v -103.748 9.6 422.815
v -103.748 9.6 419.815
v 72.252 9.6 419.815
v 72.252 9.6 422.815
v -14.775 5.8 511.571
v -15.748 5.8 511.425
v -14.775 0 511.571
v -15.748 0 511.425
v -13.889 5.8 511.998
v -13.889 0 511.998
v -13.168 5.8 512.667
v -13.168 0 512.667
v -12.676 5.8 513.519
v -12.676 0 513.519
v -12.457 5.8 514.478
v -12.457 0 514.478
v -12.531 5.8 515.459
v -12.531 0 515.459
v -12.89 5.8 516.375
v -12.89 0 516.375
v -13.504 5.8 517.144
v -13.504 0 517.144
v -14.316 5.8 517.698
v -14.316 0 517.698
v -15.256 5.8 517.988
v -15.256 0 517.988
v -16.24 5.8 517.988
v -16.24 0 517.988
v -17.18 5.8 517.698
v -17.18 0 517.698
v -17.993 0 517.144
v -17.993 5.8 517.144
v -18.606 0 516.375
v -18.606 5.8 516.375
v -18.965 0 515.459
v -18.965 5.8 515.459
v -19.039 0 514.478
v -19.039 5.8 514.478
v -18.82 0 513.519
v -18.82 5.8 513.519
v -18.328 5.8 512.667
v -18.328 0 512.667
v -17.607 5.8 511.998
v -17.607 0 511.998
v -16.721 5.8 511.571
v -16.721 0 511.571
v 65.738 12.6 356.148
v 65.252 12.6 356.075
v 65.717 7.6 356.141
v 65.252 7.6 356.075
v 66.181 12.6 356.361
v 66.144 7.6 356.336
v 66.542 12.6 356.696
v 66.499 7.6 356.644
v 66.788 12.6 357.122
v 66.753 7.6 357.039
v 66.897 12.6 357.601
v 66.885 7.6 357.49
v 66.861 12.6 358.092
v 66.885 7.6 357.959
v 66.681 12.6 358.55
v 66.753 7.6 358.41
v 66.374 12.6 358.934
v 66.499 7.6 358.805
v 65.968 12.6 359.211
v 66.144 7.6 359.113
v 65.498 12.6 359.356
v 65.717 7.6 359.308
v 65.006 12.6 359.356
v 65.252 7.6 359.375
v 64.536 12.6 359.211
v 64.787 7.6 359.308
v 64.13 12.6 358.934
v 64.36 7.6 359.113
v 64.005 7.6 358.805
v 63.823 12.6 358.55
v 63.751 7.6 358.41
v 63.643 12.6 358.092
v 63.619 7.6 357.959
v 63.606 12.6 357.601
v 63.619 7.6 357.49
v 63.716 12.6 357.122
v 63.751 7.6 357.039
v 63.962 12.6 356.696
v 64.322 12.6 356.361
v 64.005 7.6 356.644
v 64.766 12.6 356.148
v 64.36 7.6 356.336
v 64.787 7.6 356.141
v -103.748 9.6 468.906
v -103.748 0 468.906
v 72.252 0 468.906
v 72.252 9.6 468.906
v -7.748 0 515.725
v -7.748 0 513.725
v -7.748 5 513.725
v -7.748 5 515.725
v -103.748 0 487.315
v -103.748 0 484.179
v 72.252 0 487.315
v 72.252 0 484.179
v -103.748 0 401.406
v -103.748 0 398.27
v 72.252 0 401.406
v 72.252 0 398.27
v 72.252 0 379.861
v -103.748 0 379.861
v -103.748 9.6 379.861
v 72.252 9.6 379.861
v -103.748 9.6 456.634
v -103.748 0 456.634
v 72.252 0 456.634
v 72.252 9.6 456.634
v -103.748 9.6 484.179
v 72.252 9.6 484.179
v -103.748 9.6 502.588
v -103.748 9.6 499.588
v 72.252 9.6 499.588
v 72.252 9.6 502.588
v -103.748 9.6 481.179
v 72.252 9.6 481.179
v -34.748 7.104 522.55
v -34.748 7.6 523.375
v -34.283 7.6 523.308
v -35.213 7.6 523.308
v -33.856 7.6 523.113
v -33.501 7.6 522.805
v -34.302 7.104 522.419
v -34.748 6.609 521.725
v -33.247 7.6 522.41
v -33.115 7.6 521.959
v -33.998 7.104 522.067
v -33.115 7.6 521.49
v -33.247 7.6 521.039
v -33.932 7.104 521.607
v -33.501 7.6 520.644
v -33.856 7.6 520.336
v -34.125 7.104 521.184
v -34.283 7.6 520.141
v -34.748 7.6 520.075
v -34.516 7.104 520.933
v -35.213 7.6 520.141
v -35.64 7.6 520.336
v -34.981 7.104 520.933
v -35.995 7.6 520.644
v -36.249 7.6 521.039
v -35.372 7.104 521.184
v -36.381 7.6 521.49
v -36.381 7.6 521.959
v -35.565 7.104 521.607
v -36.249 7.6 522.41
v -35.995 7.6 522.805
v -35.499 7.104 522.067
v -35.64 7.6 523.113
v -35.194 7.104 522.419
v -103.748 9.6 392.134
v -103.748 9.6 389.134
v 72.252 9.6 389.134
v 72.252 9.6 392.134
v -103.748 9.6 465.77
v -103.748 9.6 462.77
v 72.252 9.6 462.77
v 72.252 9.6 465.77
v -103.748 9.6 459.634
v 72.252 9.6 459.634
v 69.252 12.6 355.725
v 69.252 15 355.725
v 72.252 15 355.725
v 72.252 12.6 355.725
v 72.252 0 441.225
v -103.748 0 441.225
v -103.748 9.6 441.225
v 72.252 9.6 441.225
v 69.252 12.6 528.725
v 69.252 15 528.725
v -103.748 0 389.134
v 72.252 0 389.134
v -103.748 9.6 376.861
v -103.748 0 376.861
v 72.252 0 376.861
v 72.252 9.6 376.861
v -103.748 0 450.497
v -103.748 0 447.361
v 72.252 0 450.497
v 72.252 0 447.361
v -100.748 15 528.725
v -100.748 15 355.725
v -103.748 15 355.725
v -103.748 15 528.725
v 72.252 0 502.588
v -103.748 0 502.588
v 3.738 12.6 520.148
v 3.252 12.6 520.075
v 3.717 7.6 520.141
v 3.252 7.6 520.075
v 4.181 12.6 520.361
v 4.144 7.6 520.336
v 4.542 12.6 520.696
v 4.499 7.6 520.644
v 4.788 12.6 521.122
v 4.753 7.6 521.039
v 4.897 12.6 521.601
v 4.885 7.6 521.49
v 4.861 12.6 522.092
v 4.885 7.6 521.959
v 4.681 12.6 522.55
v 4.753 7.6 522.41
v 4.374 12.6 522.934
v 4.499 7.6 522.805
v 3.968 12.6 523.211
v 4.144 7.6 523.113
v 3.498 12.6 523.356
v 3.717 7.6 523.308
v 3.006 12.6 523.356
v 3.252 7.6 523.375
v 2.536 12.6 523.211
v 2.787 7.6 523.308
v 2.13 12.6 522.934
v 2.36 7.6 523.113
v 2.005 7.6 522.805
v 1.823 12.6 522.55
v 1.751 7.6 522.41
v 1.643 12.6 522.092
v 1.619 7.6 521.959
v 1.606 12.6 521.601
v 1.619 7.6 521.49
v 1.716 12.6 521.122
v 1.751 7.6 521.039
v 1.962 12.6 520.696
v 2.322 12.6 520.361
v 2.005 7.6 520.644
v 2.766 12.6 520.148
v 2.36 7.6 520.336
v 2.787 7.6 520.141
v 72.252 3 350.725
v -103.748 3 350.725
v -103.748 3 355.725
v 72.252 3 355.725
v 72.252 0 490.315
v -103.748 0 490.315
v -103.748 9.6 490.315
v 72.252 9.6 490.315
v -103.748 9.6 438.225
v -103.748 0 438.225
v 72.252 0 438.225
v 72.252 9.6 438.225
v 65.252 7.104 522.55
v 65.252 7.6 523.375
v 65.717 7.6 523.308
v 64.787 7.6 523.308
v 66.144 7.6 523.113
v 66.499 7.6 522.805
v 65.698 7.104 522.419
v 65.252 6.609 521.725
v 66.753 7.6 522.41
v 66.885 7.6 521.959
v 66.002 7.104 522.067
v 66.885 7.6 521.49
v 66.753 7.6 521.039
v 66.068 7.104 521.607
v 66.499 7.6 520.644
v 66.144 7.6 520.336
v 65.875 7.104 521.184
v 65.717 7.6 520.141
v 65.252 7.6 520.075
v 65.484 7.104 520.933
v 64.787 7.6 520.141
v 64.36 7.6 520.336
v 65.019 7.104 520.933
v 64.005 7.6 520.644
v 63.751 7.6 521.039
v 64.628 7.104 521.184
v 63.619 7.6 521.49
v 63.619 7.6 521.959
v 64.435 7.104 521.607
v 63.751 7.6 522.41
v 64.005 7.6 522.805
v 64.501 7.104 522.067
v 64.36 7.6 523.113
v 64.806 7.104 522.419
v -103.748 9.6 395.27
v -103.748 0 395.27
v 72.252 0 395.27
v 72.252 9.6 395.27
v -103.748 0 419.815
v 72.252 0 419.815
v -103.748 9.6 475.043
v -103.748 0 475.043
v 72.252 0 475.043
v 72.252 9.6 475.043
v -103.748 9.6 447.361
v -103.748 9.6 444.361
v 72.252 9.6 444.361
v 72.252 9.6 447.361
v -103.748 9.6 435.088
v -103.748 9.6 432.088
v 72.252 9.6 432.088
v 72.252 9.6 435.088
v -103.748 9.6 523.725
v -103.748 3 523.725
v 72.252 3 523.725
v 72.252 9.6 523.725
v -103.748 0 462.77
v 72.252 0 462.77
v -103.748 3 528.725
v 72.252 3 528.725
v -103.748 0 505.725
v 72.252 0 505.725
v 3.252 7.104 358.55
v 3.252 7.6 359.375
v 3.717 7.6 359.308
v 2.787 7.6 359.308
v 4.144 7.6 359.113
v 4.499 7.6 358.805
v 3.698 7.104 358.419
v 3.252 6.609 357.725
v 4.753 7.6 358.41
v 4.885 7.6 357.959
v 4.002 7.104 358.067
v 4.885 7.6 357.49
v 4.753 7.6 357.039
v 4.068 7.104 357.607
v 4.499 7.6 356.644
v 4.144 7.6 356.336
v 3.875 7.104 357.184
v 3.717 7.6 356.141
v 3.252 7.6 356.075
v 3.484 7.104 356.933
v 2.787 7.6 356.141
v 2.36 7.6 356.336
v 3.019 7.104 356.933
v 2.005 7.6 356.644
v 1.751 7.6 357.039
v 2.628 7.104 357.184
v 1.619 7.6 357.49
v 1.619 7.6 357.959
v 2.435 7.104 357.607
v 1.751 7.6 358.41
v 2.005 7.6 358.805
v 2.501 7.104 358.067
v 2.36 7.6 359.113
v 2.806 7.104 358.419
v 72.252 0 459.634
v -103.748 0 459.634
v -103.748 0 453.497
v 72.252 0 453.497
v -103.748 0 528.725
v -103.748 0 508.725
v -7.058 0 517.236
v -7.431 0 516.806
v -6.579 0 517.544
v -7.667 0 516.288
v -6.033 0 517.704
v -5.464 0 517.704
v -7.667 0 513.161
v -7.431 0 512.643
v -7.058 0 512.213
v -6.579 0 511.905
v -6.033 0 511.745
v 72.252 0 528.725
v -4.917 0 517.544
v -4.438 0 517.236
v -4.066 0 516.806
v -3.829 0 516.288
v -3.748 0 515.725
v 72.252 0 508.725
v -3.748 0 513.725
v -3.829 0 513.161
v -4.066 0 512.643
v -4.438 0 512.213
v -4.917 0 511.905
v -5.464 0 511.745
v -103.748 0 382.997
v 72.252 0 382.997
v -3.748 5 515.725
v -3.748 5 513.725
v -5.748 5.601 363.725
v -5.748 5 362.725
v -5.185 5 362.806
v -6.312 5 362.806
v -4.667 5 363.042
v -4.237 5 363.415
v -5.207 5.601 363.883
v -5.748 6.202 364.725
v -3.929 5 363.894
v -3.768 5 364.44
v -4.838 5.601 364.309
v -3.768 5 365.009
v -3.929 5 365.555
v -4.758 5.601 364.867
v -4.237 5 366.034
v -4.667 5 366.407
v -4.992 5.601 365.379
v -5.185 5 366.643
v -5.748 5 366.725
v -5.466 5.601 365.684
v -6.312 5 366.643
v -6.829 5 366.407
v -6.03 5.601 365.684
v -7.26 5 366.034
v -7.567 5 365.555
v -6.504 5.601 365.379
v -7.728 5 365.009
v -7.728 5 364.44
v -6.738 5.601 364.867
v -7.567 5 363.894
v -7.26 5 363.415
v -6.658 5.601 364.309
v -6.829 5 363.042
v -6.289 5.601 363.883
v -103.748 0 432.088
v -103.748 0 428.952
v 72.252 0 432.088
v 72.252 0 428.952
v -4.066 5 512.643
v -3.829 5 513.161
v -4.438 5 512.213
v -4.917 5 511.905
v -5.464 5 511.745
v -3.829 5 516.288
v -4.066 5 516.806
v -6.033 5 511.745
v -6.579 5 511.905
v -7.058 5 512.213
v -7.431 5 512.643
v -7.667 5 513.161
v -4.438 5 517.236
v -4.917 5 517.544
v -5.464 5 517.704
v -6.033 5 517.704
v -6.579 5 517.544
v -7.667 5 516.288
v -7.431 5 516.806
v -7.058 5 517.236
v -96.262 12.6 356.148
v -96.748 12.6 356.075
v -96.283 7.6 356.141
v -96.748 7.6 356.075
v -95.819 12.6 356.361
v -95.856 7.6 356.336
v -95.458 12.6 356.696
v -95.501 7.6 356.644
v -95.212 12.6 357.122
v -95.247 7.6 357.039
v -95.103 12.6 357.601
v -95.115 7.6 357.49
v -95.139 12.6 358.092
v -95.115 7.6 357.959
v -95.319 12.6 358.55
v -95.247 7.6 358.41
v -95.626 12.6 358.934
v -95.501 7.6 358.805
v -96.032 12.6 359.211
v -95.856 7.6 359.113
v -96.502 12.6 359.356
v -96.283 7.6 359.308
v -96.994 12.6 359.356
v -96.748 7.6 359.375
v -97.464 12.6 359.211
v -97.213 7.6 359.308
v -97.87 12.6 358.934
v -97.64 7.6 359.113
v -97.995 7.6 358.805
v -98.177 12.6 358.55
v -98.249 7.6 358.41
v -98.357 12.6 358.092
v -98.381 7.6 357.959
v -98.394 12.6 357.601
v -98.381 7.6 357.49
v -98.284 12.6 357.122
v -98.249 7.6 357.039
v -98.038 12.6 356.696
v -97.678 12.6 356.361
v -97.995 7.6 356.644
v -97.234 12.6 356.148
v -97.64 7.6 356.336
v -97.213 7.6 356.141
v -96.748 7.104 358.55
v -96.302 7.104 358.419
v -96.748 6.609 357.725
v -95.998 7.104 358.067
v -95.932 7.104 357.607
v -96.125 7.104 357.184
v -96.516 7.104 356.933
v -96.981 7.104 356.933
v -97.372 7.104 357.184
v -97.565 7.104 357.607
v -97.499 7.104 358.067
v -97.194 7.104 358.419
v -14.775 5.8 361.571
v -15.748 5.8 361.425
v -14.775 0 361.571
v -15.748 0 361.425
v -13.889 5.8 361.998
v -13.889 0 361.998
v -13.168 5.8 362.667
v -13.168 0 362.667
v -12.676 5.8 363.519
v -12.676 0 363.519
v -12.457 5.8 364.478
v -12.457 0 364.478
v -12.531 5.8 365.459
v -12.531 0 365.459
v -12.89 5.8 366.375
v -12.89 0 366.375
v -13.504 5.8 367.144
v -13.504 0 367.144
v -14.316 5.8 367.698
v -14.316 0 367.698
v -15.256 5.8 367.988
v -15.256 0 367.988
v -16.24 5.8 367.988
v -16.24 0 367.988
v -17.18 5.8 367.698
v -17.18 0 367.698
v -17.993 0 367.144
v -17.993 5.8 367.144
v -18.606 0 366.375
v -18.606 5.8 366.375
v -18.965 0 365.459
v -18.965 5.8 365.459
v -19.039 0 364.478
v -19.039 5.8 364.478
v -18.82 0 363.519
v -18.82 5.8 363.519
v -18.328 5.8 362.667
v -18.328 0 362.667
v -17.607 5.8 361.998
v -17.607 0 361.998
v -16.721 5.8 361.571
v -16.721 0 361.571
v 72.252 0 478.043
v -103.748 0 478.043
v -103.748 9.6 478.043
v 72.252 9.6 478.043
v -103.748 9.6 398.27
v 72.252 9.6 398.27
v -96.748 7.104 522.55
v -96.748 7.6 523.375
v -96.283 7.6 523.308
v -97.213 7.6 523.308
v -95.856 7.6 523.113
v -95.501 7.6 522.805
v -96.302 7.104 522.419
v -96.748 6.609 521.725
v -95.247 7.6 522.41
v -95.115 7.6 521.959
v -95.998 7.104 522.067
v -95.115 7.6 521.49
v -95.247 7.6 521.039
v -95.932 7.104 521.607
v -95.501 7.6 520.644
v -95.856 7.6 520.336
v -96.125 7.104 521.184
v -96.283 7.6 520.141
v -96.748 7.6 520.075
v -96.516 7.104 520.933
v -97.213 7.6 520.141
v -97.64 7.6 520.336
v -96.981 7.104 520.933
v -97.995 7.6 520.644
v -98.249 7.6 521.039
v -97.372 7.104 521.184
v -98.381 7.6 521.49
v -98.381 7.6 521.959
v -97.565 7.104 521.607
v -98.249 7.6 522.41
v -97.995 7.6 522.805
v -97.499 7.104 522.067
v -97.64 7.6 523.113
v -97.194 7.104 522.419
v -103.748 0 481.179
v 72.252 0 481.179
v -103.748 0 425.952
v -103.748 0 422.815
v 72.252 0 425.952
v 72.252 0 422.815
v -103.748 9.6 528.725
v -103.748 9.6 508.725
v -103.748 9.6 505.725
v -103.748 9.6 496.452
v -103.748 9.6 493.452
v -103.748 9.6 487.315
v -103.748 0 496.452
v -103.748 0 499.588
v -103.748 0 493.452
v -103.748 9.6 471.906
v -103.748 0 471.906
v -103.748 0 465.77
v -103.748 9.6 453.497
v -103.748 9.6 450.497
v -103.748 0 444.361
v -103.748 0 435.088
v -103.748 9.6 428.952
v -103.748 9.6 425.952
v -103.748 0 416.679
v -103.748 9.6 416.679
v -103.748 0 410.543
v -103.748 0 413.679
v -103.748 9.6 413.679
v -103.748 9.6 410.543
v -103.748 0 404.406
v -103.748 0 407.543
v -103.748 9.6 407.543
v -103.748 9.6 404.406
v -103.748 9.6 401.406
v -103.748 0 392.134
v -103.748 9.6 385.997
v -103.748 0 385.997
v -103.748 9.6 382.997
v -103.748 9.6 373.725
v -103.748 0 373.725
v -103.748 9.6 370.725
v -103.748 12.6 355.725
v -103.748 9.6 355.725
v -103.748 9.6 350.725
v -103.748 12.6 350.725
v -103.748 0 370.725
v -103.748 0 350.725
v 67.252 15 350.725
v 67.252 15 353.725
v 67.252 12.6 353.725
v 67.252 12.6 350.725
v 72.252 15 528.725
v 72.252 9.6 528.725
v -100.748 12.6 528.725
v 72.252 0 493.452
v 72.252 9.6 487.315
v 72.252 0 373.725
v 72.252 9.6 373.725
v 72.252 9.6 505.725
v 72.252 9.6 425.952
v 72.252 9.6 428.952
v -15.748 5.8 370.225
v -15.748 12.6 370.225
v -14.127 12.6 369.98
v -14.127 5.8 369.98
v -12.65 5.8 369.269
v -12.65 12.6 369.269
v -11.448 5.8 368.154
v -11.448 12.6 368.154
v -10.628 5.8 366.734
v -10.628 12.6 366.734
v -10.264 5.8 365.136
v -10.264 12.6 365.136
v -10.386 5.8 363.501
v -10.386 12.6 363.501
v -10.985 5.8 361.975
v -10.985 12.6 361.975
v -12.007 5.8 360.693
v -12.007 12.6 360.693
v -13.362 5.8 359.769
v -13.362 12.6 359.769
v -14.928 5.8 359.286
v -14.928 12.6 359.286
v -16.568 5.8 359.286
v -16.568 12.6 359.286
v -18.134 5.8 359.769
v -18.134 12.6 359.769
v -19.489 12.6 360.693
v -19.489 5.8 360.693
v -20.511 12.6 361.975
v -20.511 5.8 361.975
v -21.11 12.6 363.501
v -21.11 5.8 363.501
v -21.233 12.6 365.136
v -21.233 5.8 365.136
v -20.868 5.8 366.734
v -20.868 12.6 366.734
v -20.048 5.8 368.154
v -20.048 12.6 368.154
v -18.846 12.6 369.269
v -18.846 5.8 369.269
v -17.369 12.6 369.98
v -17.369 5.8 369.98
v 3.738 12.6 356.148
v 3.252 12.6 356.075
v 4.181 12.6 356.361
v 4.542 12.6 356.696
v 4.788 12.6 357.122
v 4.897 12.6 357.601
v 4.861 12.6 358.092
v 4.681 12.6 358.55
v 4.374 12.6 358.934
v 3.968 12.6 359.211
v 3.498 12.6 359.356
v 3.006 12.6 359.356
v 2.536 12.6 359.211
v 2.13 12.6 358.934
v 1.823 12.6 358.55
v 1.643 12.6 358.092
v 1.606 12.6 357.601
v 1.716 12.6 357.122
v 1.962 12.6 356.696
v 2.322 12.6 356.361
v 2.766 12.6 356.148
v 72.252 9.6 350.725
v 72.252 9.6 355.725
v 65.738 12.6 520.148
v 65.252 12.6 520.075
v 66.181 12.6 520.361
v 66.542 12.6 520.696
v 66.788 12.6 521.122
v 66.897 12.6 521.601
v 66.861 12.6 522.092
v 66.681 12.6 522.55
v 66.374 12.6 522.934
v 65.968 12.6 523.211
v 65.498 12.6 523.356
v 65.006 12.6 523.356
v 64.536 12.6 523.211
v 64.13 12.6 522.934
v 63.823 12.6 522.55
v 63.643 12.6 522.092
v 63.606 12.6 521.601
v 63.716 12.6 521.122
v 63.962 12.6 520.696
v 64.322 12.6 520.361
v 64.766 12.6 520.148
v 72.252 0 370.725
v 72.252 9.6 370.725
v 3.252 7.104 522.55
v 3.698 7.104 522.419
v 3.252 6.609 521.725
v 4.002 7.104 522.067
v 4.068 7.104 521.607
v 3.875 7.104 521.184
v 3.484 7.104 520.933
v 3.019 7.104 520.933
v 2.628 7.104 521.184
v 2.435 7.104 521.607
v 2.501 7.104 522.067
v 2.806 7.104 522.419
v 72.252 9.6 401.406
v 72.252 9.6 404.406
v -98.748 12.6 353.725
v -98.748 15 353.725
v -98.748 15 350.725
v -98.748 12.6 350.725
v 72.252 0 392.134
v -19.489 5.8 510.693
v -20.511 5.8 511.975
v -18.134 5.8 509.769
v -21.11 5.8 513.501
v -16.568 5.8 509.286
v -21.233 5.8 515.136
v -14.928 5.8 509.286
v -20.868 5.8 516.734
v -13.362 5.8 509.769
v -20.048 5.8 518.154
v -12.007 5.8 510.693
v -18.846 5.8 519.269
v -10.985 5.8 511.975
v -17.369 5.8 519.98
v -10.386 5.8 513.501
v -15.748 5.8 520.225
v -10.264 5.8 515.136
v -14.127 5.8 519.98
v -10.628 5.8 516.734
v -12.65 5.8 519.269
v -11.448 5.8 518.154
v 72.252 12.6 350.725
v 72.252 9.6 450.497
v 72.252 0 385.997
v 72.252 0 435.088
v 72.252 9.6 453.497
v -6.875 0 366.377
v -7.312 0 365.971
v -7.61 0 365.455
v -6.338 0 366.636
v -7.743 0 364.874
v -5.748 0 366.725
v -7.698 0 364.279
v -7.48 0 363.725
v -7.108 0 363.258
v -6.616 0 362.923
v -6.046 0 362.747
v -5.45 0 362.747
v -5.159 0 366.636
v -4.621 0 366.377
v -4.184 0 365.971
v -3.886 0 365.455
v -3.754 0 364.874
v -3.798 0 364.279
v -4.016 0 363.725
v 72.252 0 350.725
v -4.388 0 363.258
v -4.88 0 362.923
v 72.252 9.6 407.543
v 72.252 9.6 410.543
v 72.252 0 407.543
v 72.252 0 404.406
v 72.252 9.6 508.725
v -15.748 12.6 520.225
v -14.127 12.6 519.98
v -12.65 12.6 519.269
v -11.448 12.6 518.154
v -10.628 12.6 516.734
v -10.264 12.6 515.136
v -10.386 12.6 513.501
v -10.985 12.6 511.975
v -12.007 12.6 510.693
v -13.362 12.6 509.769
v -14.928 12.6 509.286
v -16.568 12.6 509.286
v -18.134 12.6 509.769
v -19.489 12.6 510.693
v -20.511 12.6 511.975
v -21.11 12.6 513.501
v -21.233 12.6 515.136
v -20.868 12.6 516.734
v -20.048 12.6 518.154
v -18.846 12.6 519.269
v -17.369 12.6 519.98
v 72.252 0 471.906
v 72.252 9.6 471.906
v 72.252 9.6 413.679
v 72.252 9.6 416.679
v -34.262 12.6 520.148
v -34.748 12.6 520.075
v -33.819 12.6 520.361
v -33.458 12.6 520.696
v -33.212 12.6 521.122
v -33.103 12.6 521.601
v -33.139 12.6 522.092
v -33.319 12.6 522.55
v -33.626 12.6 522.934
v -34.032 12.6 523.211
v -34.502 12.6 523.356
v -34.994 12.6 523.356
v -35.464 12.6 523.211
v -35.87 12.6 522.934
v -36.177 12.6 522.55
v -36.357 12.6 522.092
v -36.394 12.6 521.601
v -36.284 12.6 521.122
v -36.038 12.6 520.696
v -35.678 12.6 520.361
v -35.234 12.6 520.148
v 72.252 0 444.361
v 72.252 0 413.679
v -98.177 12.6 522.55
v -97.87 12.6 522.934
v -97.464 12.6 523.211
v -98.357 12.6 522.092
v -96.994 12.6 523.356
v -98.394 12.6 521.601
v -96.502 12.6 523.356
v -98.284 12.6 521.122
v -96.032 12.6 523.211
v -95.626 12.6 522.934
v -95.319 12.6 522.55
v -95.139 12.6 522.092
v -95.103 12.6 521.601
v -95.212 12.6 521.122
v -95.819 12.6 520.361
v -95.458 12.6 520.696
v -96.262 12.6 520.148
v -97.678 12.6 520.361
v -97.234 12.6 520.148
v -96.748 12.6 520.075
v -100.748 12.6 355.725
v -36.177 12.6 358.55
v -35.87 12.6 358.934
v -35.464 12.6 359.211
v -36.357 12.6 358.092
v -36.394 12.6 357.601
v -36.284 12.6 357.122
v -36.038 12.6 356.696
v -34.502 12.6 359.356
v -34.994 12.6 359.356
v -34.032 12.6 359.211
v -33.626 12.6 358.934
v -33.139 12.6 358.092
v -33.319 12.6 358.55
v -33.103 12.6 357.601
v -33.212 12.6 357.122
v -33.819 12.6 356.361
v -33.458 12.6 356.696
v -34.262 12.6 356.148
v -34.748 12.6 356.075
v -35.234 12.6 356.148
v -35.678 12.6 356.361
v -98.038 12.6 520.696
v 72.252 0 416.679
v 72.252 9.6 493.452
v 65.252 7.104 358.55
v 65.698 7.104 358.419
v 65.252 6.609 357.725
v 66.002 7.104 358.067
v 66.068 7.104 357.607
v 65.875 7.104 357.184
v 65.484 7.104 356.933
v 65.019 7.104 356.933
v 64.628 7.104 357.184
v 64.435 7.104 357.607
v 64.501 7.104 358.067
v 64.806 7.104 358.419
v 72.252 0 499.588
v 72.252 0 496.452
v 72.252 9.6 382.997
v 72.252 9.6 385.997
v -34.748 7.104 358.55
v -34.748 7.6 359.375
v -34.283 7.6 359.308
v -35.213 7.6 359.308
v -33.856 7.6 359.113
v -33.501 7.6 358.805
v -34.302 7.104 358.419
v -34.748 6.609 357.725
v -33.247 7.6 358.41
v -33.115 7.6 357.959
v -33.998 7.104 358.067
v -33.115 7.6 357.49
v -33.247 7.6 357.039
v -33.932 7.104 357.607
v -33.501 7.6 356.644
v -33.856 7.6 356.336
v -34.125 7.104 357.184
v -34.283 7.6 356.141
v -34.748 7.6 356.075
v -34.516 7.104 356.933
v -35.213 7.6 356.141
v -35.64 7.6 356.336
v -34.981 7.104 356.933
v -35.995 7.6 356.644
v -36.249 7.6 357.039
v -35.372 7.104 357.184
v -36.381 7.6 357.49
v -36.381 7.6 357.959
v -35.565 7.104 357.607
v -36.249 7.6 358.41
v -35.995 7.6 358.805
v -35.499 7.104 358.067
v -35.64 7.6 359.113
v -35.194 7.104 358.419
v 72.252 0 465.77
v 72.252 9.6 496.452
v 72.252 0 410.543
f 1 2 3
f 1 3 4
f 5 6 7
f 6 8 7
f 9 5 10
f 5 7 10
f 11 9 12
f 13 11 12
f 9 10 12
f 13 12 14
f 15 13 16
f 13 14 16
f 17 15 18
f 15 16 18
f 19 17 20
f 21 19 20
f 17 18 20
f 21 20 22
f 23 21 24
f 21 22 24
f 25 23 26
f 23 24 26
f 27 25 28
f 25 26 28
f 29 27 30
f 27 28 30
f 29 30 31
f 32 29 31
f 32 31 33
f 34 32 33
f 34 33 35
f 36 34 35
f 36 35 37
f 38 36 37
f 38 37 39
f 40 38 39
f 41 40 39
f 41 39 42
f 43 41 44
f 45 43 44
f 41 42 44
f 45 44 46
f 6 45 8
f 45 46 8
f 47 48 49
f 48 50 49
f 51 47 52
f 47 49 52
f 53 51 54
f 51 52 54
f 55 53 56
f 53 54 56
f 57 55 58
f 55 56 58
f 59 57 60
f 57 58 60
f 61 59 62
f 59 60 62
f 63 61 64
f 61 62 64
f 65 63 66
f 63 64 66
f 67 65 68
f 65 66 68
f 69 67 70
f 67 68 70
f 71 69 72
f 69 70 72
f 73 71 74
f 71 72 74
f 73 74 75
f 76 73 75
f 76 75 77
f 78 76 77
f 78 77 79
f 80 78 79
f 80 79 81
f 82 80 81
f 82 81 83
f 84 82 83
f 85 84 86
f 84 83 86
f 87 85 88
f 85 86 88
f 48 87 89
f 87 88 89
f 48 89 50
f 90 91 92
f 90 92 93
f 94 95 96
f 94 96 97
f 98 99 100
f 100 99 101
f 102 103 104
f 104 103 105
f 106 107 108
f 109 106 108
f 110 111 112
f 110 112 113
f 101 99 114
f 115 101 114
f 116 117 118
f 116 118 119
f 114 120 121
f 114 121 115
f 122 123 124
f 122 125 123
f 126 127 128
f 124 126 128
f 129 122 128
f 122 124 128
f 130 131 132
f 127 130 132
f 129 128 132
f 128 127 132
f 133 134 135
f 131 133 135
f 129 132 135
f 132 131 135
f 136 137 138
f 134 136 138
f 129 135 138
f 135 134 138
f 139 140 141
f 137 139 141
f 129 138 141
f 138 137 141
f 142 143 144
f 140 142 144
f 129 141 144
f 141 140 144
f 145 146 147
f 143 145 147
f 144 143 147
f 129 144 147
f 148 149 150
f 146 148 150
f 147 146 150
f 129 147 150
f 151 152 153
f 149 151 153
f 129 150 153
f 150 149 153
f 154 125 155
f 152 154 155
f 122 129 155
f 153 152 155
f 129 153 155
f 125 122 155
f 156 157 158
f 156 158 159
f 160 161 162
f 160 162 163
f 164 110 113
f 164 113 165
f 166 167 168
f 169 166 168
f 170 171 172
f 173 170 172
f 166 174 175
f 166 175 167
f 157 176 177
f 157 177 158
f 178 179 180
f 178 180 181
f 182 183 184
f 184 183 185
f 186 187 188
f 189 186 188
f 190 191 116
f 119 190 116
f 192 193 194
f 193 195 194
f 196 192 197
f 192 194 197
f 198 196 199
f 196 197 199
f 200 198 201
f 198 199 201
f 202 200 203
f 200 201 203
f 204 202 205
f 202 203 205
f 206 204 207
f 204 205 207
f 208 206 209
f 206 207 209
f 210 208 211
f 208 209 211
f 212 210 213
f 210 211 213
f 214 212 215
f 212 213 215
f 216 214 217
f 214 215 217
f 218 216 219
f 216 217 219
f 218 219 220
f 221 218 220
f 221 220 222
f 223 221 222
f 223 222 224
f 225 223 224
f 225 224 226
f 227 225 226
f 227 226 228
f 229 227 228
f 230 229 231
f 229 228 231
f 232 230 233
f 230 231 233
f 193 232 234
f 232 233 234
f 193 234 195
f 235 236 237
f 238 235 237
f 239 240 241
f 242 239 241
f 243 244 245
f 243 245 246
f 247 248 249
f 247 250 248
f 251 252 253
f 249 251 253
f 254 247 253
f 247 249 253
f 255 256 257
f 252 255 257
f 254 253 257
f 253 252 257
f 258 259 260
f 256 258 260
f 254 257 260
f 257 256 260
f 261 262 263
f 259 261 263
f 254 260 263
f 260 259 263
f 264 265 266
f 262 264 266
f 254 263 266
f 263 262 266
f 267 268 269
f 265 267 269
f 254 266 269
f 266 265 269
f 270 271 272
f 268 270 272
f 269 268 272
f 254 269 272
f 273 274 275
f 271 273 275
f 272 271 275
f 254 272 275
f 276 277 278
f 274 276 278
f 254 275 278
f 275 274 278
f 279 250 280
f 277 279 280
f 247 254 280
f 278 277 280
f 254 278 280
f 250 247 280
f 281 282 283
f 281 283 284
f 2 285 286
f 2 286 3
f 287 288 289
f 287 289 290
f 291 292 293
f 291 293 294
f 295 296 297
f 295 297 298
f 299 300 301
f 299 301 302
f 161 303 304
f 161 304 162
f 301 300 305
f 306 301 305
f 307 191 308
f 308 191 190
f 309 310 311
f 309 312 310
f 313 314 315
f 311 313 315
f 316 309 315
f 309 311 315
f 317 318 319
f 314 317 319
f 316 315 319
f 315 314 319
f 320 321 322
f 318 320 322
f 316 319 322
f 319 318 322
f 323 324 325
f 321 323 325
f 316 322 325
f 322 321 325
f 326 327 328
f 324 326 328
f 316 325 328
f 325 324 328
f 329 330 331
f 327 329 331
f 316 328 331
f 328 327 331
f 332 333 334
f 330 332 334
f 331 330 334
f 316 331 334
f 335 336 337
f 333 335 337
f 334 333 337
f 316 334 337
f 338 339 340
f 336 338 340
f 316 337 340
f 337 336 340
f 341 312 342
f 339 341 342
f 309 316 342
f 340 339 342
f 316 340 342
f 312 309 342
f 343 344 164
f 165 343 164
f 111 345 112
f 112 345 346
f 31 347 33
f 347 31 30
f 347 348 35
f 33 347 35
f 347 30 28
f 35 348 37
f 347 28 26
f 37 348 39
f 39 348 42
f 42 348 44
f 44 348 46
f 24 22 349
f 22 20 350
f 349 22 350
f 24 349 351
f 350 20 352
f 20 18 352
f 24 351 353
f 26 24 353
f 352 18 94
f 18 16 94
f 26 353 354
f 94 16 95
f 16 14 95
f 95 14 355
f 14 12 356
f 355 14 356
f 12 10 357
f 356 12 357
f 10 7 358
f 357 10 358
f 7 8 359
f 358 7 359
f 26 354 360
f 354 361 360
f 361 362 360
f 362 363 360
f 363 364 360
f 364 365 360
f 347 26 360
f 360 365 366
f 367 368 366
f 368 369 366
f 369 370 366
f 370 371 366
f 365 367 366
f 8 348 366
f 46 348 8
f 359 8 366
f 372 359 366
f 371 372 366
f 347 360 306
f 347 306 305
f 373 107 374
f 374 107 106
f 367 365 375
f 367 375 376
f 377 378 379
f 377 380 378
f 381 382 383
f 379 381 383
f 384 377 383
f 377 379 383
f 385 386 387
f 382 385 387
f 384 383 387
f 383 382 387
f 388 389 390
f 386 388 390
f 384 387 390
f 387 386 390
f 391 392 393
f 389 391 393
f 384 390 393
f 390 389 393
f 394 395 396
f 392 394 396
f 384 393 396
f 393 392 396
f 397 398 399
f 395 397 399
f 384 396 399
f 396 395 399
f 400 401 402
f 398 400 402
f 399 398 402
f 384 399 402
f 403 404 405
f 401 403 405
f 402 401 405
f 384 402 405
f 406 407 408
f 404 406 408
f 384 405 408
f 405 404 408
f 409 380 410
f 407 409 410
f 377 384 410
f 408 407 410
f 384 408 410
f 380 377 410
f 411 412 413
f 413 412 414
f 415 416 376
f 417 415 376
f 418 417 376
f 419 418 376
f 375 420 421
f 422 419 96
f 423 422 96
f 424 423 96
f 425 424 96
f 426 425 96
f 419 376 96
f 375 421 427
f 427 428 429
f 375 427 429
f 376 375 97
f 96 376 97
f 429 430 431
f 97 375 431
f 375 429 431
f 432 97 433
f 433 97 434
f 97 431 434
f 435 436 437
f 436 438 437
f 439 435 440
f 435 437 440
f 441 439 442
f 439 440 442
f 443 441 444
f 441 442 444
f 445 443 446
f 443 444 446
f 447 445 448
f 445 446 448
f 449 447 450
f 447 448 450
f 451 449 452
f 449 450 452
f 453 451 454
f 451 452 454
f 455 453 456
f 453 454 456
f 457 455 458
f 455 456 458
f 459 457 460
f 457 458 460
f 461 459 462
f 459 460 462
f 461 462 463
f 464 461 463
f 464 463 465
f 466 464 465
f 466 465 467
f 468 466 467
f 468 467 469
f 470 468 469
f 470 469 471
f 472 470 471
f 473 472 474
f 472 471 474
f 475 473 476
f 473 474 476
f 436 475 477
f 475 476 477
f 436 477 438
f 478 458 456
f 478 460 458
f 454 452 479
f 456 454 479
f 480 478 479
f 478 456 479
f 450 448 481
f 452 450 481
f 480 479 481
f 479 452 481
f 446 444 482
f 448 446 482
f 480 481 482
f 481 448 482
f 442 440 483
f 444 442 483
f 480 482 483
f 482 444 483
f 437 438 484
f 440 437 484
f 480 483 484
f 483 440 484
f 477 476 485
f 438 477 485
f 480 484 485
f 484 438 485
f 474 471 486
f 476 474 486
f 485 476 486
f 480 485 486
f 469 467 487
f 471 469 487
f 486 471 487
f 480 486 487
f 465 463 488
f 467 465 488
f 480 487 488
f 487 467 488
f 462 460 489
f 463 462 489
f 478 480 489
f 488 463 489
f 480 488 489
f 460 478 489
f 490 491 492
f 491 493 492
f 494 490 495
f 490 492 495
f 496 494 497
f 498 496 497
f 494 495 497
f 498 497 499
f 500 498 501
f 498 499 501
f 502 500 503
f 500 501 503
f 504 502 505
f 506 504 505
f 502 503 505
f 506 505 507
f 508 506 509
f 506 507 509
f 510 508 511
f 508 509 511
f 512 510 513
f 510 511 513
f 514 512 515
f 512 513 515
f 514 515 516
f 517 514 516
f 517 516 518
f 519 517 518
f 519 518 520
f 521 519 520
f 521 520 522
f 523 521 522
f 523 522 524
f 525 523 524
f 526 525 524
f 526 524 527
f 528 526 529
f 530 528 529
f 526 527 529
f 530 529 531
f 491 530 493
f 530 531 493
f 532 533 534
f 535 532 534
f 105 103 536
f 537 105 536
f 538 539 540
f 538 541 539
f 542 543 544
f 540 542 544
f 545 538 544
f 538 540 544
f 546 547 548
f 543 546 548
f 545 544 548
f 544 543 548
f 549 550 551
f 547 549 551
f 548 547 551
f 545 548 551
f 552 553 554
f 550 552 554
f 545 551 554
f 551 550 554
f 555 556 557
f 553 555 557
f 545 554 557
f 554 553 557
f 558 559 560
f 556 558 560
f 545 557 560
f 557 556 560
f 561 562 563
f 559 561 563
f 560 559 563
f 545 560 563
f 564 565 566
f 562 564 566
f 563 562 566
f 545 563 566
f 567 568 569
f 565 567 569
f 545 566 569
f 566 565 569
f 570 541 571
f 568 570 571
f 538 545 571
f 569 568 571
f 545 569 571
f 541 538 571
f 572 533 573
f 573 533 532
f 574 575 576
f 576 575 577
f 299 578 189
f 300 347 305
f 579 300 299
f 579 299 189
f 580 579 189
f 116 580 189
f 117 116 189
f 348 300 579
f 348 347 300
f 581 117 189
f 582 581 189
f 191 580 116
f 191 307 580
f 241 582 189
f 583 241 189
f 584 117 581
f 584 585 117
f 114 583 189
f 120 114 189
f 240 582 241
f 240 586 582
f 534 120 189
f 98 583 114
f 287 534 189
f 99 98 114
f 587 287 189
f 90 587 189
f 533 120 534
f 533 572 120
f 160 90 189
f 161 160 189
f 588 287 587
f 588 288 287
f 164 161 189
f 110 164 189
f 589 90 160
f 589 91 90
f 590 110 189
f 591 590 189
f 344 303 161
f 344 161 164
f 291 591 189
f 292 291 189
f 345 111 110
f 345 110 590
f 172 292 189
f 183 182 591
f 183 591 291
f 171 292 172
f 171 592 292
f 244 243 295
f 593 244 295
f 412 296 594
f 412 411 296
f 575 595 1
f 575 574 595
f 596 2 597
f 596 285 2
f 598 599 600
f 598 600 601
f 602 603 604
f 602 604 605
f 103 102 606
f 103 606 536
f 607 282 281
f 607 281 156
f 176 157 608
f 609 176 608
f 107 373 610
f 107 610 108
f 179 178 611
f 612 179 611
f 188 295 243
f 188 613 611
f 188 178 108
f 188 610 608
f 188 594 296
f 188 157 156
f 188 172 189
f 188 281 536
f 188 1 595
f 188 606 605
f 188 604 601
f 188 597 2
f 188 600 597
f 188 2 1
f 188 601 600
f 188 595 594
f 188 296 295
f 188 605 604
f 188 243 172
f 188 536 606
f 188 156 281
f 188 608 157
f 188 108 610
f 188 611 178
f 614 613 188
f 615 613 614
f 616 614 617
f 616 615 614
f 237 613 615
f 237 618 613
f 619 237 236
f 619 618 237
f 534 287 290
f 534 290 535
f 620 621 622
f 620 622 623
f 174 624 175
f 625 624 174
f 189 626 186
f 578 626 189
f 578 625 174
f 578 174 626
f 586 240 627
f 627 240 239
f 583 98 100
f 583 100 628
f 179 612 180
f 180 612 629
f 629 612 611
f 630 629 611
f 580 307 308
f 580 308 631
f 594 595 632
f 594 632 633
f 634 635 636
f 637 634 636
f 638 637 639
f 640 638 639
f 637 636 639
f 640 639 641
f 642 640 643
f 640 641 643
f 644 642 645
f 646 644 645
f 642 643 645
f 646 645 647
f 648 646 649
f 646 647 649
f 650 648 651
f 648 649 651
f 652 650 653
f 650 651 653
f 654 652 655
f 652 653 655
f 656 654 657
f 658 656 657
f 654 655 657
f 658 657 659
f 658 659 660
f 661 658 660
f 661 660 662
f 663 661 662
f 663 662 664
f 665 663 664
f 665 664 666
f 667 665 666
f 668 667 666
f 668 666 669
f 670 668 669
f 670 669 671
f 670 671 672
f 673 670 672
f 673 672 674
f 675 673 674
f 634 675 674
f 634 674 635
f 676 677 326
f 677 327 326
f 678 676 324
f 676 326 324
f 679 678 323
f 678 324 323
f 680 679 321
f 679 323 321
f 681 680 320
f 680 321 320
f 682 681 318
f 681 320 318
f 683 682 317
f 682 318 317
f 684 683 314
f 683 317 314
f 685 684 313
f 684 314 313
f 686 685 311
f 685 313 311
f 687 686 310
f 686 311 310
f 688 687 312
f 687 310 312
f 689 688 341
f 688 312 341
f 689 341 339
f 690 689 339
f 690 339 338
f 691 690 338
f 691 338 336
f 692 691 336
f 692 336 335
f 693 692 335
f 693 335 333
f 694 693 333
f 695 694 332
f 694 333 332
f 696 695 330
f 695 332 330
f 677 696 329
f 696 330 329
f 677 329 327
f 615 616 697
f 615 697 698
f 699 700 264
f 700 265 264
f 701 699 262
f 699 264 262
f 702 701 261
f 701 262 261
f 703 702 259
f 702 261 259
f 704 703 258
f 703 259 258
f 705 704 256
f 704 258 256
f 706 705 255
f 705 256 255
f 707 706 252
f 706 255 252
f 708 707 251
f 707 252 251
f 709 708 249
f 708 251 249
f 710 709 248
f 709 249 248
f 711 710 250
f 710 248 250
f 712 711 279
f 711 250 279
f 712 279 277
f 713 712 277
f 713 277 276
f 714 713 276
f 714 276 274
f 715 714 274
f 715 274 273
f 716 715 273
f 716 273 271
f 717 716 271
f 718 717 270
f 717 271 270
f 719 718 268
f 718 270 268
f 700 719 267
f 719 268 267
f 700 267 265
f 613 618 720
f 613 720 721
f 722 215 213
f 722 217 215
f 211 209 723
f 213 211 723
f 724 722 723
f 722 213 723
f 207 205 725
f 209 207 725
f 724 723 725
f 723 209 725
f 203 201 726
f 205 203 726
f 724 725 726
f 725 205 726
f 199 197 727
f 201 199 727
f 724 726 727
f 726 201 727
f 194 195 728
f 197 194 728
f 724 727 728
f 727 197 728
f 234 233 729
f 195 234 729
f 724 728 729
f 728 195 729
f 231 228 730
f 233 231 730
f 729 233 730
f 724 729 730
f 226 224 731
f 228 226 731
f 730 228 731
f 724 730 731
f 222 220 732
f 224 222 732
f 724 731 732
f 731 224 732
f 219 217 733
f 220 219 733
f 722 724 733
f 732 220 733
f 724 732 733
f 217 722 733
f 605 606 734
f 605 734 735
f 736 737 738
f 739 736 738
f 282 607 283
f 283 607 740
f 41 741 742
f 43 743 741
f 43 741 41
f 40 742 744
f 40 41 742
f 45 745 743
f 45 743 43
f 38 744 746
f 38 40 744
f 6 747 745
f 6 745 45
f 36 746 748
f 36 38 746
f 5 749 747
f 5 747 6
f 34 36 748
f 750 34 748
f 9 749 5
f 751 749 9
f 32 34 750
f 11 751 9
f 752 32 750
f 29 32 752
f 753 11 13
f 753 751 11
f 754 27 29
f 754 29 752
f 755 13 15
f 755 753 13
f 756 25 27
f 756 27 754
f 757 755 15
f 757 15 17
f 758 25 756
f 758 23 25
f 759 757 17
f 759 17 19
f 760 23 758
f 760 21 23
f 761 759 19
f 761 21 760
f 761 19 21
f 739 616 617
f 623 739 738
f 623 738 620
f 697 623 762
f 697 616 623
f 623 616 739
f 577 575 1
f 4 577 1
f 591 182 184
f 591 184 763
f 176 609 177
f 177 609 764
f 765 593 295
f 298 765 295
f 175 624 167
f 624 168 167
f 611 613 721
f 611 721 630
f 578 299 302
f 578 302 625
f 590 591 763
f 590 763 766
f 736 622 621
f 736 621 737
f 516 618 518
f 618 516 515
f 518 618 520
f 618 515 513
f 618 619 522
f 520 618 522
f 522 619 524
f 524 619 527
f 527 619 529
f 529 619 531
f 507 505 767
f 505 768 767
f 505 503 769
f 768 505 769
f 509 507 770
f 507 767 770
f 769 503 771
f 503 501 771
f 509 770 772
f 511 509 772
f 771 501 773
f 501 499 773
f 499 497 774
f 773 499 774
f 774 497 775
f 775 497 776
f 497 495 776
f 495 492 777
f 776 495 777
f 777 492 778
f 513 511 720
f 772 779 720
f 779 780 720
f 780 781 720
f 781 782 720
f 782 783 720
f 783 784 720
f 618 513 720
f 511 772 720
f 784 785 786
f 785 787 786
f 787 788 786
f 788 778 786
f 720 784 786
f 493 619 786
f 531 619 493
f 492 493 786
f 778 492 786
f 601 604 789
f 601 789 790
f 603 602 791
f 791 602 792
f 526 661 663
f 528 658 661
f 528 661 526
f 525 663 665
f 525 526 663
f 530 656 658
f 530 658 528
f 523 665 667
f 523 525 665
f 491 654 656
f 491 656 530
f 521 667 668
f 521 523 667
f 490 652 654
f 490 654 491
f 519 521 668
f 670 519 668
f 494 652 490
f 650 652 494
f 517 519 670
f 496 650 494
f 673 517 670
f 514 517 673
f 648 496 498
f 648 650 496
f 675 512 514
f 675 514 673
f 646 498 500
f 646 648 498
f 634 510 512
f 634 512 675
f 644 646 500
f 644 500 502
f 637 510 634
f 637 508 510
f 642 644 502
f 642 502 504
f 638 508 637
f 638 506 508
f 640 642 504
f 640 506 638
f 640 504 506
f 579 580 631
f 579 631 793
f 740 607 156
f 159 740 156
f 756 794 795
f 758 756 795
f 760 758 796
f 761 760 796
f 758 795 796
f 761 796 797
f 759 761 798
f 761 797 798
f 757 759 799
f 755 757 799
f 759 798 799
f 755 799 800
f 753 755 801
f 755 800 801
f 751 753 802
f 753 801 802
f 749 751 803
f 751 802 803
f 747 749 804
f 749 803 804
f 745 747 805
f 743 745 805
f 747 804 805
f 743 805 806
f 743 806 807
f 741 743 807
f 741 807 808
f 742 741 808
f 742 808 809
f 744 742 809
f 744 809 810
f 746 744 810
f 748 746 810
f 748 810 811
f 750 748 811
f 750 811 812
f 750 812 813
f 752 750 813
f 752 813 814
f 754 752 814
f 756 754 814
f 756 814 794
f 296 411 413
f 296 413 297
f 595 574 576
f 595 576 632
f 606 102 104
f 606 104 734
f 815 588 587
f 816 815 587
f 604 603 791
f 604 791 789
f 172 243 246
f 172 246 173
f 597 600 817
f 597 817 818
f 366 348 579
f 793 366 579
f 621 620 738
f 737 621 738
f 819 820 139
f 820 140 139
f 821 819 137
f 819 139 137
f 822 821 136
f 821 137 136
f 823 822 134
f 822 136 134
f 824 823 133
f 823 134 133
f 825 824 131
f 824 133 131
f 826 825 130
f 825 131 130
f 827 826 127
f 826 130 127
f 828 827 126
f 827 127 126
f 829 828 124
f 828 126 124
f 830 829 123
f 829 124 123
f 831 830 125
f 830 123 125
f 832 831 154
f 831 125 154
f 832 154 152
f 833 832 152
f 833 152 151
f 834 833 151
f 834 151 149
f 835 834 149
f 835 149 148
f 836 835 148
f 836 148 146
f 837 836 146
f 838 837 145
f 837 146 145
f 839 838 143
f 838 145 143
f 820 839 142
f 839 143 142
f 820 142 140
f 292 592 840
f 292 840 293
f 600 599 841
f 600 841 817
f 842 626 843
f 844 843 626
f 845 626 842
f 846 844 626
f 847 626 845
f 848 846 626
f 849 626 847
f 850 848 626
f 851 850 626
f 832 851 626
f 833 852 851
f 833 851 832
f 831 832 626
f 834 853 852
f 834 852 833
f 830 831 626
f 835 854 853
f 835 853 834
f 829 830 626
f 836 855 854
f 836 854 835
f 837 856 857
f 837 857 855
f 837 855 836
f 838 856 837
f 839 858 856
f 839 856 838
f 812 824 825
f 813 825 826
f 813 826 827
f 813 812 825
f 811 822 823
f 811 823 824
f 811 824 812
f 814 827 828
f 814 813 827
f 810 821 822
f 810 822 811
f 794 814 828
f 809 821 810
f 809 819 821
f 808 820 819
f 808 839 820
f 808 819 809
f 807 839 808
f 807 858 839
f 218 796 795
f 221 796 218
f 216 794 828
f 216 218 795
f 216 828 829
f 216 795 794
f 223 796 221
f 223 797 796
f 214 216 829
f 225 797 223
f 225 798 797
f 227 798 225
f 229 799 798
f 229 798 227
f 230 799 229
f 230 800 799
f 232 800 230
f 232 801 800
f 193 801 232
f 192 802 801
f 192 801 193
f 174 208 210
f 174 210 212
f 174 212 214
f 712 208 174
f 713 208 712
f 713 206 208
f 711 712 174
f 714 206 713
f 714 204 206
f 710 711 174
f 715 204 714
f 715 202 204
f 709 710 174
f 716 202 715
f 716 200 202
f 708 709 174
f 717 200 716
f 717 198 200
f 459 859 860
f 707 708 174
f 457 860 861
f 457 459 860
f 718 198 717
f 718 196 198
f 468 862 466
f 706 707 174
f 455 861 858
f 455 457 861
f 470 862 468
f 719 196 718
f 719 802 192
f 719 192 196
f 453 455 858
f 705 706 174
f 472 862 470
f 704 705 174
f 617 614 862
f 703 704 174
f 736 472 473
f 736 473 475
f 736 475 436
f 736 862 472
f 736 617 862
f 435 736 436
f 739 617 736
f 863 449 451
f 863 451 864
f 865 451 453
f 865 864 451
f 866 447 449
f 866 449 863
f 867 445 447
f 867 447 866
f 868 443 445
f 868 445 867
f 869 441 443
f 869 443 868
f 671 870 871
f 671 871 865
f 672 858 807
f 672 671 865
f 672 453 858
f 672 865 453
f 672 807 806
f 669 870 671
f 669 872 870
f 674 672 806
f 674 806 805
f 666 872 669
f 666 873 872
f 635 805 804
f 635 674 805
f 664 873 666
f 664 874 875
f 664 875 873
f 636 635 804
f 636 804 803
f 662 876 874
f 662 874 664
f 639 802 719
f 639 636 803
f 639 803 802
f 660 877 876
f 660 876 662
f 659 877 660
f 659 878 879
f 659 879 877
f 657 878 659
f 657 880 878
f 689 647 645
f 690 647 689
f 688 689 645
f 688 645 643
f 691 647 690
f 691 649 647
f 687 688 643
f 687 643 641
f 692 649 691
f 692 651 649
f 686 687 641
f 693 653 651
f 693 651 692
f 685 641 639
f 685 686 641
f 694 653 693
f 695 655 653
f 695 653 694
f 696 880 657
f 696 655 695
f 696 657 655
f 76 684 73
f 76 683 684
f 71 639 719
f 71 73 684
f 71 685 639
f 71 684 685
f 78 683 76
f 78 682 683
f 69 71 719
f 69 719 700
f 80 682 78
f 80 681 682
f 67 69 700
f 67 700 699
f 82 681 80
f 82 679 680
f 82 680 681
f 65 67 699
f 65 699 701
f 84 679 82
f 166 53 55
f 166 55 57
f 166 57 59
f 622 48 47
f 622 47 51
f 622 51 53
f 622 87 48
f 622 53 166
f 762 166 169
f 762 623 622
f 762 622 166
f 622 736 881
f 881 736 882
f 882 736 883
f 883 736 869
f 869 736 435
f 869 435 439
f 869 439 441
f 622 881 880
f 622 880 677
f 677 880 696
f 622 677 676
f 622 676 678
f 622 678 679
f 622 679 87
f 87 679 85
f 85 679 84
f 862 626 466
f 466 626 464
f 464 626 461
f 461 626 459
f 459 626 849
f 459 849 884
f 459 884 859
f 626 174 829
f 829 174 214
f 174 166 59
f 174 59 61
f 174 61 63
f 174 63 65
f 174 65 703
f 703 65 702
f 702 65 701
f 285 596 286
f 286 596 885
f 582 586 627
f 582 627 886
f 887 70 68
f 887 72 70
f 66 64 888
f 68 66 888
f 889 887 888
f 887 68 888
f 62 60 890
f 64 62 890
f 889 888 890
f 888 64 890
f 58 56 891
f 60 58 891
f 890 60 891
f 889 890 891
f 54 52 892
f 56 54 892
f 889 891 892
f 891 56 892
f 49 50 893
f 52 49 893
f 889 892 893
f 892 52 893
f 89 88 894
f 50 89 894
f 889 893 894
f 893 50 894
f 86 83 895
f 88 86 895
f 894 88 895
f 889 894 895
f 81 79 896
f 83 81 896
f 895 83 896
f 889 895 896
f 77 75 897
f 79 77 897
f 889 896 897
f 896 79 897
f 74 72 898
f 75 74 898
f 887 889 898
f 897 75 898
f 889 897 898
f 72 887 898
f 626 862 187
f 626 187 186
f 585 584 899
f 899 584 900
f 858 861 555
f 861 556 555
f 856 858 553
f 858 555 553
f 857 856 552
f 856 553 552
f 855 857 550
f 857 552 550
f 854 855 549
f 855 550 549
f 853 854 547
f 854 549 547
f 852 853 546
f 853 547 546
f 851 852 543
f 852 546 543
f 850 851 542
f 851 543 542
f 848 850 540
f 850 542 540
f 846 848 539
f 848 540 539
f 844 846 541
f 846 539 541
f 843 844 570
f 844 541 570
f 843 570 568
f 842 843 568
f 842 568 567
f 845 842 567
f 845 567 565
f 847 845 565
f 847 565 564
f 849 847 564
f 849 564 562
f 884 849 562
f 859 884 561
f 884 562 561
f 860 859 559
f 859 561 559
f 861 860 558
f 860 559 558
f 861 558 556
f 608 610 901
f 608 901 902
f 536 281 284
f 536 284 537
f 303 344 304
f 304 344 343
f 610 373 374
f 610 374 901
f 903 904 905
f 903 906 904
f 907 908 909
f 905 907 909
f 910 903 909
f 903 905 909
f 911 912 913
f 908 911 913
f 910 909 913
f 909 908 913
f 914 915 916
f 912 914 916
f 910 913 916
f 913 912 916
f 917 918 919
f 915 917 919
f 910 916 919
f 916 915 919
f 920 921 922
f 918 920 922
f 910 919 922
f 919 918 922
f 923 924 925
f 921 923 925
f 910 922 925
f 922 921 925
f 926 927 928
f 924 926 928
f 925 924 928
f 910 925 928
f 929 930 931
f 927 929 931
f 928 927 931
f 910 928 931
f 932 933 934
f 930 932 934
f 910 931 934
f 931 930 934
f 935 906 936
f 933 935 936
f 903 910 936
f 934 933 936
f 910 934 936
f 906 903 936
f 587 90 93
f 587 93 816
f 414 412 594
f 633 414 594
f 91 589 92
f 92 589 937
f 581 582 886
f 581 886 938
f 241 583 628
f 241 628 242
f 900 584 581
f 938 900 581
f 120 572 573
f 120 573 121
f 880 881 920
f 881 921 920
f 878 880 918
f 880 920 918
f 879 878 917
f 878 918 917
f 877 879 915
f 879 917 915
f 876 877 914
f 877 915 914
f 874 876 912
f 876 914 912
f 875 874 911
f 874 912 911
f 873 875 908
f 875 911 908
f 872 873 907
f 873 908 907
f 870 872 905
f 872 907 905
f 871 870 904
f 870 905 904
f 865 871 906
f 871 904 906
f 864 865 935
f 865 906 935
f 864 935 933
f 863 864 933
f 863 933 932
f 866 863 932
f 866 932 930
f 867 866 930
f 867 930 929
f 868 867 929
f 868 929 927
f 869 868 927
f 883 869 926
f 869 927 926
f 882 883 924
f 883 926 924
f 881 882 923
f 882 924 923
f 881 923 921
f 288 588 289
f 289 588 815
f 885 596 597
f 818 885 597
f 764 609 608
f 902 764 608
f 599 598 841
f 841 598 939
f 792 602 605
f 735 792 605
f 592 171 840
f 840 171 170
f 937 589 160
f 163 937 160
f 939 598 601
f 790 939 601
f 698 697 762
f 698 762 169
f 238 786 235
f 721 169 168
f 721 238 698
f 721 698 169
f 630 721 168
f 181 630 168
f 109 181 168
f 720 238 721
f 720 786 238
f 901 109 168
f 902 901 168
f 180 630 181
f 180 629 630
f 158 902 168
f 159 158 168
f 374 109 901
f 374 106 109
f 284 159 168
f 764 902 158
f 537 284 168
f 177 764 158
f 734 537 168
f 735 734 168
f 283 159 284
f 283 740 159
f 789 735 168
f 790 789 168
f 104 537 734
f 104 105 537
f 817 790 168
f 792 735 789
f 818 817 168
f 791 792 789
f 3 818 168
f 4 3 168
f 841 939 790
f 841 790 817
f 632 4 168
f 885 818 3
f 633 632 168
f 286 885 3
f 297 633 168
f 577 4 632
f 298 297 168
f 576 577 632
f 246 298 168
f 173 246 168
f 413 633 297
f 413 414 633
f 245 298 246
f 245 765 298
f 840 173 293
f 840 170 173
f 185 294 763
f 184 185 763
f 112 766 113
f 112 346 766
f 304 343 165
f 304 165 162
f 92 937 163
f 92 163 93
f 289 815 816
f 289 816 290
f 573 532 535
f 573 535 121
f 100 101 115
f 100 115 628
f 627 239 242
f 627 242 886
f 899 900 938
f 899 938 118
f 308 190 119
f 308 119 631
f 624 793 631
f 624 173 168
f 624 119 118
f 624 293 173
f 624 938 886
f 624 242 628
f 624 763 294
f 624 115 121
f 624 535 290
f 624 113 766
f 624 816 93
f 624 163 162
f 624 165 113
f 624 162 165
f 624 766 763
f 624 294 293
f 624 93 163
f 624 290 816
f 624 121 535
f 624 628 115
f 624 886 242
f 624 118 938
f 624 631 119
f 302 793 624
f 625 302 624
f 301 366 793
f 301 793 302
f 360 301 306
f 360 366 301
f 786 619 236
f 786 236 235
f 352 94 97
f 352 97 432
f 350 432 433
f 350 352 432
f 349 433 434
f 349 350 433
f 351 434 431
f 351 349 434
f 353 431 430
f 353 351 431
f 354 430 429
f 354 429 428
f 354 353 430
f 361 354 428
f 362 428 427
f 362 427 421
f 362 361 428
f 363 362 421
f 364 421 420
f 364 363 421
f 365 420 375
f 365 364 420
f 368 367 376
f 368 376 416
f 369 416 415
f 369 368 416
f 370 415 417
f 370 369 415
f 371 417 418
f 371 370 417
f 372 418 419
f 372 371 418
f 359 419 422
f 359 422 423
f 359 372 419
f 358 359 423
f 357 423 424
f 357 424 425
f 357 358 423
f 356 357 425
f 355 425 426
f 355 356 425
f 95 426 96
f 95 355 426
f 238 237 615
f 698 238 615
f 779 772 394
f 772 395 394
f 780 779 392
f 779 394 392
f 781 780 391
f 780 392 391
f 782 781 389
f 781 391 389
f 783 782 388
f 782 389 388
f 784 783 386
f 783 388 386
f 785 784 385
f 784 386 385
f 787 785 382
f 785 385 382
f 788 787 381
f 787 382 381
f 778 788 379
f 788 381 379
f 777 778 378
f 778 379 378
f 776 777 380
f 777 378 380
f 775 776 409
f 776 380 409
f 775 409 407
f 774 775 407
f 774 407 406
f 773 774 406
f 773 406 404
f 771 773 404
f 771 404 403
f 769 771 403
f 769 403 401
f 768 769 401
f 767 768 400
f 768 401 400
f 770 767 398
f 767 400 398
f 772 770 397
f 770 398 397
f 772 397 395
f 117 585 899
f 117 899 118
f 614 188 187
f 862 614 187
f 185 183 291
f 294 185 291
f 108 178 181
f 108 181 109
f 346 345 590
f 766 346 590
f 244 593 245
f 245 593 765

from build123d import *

# Parameters (mm, degrees)
SKETCH_1_W                = 176
SKETCH_1_H                = 178
EXTRUDE_1_DEPTH           = 12.6
EXTRUDE_3_DEPTH           = 2.4
SKETCH_8_W                = 5
SKETCH_8_H                = 5
CUT_EXTRUDE_4_DEPTH       = 2.4
HOLE_WIZARD_M4_1_D        = 3.3
HOLE_WIZARD_M4_1_DEPTH    = 5
HOLE_WIZARD_M4_1_TIP      = 0.991420021
SKETCH_14_W               = 5
SKETCH_14_H               = 6.6
CUT_EXTRUDE_6_DEPTH       = 177
SKETCH_15_W               = 3
SKETCH_15_H               = 9.6
CUT_EXTRUDE_7_DEPTH       = 177
PATTERN_LINEAR_3_COUNT    = 23
PATTERN_LINEAR_3_PITCH    = 6.136363636
HOLE_WIZARD_2_D           = 6.6
HOLE_WIZARD_2_CBORE_D     = 11
HOLE_WIZARD_2_CBORE_DEPTH = 6.8
MM_2_D                    = 4
MM_2_DEPTH                = 5
MM_2_TIP                  = 1.201721238
CUT_EXTRUDE_11_DEPTH      = 5


with BuildPart() as part:
    # 草图1 → 凸台-拉伸1 (new body)
    with BuildSketch(Plane(origin=(0, 12.6, 0), x_dir=(1, 0, 0), z_dir=(0, 1, 0))):
        with Locations((-15.748130707, -439.724508868)):
            Rectangle(SKETCH_1_W, SKETCH_1_H)
    extrude(amount=-EXTRUDE_1_DEPTH)

    # 草图7 → 凸台-拉伸3 (add)
    with BuildSketch(Plane(origin=(0, 12.6, 0), x_dir=(1, 0, 0), z_dir=(0, 1, 0))):
        Polygon((69.251869293, -528.724508868), (69.251869293, -353.724508868), (-100.748130707, -353.724508868), (-100.748130707, -528.724508868), (-103.748130707, -528.724508868), (-103.748130707, -350.724508868), (72.251869293, -350.724508868), (72.251869293, -528.724508868), align=None)
    extrude(amount=EXTRUDE_3_DEPTH)

    # 草图8 → 切除-拉伸4 (cut)
    with BuildSketch(Plane(origin=(0, 15, 0), x_dir=(1, 0, 0), z_dir=(0, 1, 0))):
        with Locations((-101.248130707, -353.224508868)):
            Rectangle(SKETCH_8_W, SKETCH_8_H)
        with Locations((69.751869293, -353.224508868)):
            Rectangle(SKETCH_8_W, SKETCH_8_H)
    extrude(amount=-CUT_EXTRUDE_4_DEPTH, mode=Mode.SUBTRACT)

    # M4 螺纹孔1
    with Locations(Plane(origin=(-96.748130707, 12.6, 357.724508868), x_dir=(0, 0, 1), z_dir=(0, 1, 0))):
        with Locations((0, 0), (0, 62), (164, 62), (164, 0), (164, 100), (164, 162), (0, 162), (0, 100)):
            Hole(HOLE_WIZARD_M4_1_D / 2, depth=HOLE_WIZARD_M4_1_DEPTH)
            with Locations((0, 0, -(HOLE_WIZARD_M4_1_DEPTH + HOLE_WIZARD_M4_1_TIP / 2))):  # 118° drill point
                Cone(0, HOLE_WIZARD_M4_1_D / 2, HOLE_WIZARD_M4_1_TIP, mode=Mode.SUBTRACT)

    # 草图14 → 切除-拉伸6 (cut, through all)
    with BuildSketch(Plane.ZY.offset(103.748130707)):
        with Locations((526.224508868, 6.3)):
            Rectangle(SKETCH_14_W, SKETCH_14_H)
        with Locations((353.224508868, 6.3)):
            Rectangle(SKETCH_14_W, SKETCH_14_H)
    extrude(amount=-CUT_EXTRUDE_6_DEPTH, mode=Mode.SUBTRACT)

    # 草图15 → 切除-拉伸7 (cut, through all)
    with BuildSketch(Plane.ZY.offset(103.748130707)):
        with Locations((507.224508868, 4.8)):
            Rectangle(SKETCH_15_W, SKETCH_15_H)
    cut_extrude_7 = extrude(amount=-CUT_EXTRUDE_7_DEPTH, mode=Mode.SUBTRACT)

    # 阵列(线性)3: 切除-拉伸7 ×23
    with Locations(*[(0, 0, -i * PATTERN_LINEAR_3_PITCH) for i in range(1, PATTERN_LINEAR_3_COUNT)]):
        add(cut_extrude_7, mode=Mode.SUBTRACT)

    # 打孔尺寸(%根据)内六角圆柱头螺钉的类型2 (through all)
    with Locations(Plane(origin=(-15.748130707, 12.6, 514.724508868), x_dir=(0, 0, 1), z_dir=(0, 1, 0))):
        with Locations((0, 0), (-150, 0)):
            CounterBoreHole(HOLE_WIZARD_2_D / 2, HOLE_WIZARD_2_CBORE_D / 2, HOLE_WIZARD_2_CBORE_DEPTH)

    # 大小mm 暗销孔2
    with Locations(Plane(origin=(-5.748130707, 0, 364.724508868), x_dir=(0, 0, -1), z_dir=(0, -1, 0))):
        with Locations((0, 0)):
            Hole(MM_2_D / 2, depth=MM_2_DEPTH)
            with Locations((0, 0, -(MM_2_DEPTH + MM_2_TIP / 2))):  # 118° drill point
                Cone(0, MM_2_D / 2, MM_2_TIP, mode=Mode.SUBTRACT)

    # 草图22 → 切除-拉伸11 (cut)
    with BuildSketch(Plane.XZ):
        with BuildLine():
            Line((-7.748130707, 513.724508868), (-7.748130707, 515.724508868))
            ThreePointArc((-7.748130707, 515.724508868), (-5.748130707, 517.724508868), (-3.748130707, 515.724508868))
            Line((-3.748130707, 515.724508868), (-3.748130707, 513.724508868))
            ThreePointArc((-3.748130707, 513.724508868), (-5.748130707, 511.724508868), (-7.748130707, 513.724508868))
        make_face()
    extrude(amount=-CUT_EXTRUDE_11_DEPTH, mode=Mode.SUBTRACT)


solid = part.part
